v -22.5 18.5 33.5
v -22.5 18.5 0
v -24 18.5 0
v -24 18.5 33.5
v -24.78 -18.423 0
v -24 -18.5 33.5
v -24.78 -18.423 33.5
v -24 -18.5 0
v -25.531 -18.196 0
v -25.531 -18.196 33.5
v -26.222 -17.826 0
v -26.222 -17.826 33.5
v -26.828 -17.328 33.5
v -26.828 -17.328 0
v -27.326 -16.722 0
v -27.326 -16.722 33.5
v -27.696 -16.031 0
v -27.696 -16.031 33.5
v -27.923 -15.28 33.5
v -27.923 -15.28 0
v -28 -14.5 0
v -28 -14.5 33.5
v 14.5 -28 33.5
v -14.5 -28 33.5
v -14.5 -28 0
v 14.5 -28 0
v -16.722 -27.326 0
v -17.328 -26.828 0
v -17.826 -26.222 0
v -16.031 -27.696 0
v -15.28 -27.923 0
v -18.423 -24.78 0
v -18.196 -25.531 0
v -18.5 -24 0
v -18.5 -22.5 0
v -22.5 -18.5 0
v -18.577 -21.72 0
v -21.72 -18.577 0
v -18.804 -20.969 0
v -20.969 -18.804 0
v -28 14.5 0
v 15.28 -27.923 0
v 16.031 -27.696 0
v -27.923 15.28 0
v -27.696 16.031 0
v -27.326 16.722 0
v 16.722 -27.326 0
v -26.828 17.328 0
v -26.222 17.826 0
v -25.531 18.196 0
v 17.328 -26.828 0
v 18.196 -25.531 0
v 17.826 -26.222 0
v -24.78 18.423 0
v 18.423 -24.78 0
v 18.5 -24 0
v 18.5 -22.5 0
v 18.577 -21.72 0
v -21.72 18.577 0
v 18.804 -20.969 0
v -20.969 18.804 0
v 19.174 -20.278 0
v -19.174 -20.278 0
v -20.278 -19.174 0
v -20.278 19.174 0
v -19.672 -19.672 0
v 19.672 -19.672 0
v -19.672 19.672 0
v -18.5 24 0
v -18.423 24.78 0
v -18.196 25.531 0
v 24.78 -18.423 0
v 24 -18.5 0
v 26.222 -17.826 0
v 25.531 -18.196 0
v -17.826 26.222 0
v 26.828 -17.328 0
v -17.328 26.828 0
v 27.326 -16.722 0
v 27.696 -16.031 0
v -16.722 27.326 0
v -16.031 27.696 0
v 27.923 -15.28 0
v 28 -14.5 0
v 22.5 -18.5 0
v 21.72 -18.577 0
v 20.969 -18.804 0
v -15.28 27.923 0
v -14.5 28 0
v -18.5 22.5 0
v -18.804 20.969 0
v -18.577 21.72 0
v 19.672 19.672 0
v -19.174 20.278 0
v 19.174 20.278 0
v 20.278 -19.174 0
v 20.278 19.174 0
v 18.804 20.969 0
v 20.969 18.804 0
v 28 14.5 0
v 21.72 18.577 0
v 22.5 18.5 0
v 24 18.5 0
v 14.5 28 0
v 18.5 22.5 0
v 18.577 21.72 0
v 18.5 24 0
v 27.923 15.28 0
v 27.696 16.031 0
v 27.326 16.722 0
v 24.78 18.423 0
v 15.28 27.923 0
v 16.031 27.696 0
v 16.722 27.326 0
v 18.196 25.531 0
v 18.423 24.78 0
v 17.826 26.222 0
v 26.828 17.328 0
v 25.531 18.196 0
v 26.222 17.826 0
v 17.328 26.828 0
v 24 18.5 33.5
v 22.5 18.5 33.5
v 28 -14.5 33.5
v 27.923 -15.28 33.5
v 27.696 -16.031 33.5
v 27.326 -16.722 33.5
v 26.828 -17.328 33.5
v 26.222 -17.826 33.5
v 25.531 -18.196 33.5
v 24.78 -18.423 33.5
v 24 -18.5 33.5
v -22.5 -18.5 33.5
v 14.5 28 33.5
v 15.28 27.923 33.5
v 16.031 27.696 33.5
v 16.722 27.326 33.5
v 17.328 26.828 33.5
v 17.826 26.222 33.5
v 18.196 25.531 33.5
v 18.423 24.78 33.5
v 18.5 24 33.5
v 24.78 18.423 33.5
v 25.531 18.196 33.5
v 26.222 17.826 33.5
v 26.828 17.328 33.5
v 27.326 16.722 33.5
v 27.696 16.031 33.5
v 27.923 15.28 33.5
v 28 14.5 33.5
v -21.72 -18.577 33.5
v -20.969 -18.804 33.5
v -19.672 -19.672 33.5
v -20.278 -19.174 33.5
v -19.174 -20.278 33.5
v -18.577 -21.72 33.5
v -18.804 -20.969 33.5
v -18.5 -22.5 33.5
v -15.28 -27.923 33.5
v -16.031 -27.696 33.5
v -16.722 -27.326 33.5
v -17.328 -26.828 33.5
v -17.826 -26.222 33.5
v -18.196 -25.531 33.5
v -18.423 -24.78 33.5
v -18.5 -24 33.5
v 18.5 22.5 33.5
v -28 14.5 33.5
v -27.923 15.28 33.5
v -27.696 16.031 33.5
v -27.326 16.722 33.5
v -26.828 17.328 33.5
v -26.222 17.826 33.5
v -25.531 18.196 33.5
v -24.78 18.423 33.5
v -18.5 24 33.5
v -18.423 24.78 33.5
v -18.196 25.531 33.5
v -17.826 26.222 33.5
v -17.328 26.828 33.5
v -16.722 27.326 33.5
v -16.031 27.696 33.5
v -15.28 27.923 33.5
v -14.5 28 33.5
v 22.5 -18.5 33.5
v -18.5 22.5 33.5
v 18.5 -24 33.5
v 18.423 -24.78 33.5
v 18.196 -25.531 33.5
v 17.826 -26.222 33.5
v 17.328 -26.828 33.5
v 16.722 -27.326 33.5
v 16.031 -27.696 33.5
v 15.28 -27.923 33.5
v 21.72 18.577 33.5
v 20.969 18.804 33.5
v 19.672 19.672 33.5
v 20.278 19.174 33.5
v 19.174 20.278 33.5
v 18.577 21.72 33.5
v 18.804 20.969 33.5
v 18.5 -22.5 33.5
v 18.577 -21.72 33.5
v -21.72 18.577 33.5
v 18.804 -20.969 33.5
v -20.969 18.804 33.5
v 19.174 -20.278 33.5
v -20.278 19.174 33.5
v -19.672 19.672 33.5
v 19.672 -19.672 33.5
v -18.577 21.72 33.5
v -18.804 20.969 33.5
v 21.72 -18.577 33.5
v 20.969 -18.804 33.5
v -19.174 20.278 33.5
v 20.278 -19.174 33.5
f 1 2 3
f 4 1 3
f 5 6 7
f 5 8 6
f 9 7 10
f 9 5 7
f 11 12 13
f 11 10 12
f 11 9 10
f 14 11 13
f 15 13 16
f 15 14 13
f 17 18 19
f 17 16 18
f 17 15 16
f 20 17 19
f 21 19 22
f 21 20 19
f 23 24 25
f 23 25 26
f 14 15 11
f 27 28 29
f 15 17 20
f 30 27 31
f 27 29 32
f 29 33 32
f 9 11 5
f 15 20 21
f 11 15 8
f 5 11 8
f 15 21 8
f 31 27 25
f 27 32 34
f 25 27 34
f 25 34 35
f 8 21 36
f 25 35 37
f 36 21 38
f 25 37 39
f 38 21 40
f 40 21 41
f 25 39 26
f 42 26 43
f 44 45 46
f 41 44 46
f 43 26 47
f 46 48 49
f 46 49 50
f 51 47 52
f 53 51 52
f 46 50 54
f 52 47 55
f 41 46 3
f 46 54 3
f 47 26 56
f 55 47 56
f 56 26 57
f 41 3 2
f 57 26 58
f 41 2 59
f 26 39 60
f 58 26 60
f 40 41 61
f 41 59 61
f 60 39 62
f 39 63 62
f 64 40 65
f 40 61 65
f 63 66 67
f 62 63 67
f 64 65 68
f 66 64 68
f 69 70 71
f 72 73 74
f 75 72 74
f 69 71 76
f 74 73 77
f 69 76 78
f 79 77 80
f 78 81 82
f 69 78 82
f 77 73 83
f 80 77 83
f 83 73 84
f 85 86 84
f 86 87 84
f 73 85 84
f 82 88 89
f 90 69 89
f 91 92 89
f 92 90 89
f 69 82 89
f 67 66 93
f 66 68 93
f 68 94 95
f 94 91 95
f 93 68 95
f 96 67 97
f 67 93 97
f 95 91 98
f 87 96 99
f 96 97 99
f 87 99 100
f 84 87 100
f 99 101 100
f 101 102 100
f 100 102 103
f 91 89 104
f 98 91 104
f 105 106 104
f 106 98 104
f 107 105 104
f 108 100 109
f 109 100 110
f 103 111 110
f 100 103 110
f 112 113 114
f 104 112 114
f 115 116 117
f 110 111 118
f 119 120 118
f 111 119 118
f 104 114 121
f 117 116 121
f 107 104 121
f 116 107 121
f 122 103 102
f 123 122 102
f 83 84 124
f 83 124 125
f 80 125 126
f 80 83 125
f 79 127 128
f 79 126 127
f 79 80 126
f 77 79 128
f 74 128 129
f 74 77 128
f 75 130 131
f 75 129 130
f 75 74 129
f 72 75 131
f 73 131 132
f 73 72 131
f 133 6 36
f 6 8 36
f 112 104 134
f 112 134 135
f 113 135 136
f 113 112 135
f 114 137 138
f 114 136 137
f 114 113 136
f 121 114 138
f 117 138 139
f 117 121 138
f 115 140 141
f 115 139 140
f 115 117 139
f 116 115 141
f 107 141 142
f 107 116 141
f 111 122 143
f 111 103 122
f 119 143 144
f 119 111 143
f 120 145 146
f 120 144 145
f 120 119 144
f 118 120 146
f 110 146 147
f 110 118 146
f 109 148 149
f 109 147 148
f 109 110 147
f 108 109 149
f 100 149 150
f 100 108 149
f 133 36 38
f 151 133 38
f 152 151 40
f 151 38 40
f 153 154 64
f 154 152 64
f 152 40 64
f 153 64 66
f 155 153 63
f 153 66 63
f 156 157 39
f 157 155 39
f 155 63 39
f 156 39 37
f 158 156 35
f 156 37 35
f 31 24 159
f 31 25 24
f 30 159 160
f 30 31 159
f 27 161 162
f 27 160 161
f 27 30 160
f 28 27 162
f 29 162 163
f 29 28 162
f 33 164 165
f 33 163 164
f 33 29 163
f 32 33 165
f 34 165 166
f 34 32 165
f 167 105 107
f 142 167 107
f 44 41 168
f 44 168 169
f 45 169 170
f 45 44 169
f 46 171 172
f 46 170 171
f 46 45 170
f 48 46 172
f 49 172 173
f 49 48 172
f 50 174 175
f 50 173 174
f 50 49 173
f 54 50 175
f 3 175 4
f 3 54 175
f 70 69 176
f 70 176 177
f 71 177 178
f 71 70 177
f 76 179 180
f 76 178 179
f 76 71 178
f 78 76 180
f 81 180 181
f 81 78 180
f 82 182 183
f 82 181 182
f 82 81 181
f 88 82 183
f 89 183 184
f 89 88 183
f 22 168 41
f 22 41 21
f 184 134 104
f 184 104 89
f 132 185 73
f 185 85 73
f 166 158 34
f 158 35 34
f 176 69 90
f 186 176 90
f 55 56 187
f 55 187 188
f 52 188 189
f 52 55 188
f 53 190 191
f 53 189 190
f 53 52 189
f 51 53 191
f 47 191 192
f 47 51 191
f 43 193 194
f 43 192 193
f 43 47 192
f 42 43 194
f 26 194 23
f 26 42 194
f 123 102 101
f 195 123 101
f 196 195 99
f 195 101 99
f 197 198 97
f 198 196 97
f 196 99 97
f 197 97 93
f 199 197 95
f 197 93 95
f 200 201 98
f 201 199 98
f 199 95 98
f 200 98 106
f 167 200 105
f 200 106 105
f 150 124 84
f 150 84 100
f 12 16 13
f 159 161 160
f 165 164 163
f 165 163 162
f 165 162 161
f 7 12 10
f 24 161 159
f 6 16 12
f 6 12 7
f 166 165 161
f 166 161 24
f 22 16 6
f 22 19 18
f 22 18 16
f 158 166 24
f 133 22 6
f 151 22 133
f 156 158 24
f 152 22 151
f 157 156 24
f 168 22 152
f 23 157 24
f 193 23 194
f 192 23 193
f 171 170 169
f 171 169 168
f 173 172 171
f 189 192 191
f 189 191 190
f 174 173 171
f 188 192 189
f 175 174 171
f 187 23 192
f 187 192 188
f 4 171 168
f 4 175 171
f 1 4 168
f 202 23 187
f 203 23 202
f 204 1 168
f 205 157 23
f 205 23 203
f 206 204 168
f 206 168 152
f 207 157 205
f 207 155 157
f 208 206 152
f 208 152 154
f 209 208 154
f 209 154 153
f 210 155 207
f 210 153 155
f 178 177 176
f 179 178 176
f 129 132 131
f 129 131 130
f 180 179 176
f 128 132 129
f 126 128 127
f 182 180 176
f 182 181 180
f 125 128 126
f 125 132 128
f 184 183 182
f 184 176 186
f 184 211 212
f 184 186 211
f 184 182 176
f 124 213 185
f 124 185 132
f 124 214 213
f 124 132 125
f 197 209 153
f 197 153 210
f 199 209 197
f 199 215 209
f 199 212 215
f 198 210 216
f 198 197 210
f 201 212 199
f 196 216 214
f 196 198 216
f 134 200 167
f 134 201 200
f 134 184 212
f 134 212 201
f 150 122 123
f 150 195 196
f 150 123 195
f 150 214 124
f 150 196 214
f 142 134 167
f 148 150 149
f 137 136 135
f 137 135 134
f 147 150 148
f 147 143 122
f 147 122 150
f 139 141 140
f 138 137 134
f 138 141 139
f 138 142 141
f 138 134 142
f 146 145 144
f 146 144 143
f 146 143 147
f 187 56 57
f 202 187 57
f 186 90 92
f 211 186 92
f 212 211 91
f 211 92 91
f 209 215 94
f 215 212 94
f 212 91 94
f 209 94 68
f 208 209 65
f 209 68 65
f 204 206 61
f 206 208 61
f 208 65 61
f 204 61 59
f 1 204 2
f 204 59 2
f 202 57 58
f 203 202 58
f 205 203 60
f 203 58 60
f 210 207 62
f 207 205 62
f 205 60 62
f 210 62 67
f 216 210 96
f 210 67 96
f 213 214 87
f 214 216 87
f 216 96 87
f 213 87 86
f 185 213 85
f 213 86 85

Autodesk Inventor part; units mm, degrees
ref_plane "YZ Plane" through (0, 0, 0) normal (1, 0, 0) x (0, 1, 0)
ref_plane "XZ Plane" through (0, 0, 0) normal (0, 1, 0) x (-1, 0, 0)
ref_plane "XY Plane" through (0, 0, 0) normal (0, 0, 1) x (1, 0, 0)
sketch "Sketch1" plane through (0, 0, 0) normal (0, 0, 1) x (1, 0, 0)
  arc A0 (-24, 18.5) -> (-28, 14.5) centre (-24, 14.5) ccw
  line L0 (-28, 14.5) -> (-28, -14.5)
  arc A1 (-28, -14.5) -> (-24, -18.5) centre (-24, -14.5) ccw
  line L1 (-24, -18.5) -> (-22.5, -18.5)
  arc A2 (-18.5, -22.5) -> (-22.5, -18.5) centre (-22.5, -22.5) ccw
  line L2 (-18.5, -22.5) -> (-18.5, -24)
  arc A3 (-18.5, -24) -> (-14.5, -28) centre (-14.5, -24) ccw
  line L3 (-14.5, -28) -> (14.5, -28)
  arc A4 (14.5, -28) -> (18.5, -24) centre (14.5, -24) ccw
  line L4 (18.5, -24) -> (18.5, -22.5)
  arc A5 (22.5, -18.5) -> (18.5, -22.5) centre (22.5, -22.5) ccw
  line L5 (22.5, -18.5) -> (24, -18.5)
  arc A6 (24, -18.5) -> (28, -14.5) centre (24, -14.5) ccw
  line L6 (28, -14.5) -> (28, 14.5)
  arc A7 (28, 14.5) -> (24, 18.5) centre (24, 14.5) ccw
  line L7 (24, 18.5) -> (22.5, 18.5)
  arc A8 (18.5, 22.5) -> (22.5, 18.5) centre (22.5, 22.5) ccw
  line L8 (18.5, 22.5) -> (18.5, 24)
  arc A9 (18.5, 24) -> (14.5, 28) centre (14.5, 24) ccw
  line L9 (14.5, 28) -> (-14.5, 28)
  arc A10 (-14.5, 28) -> (-18.5, 24) centre (-14.5, 24) ccw
  line L10 (-18.5, 24) -> (-18.5, 22.5)
  arc A11 (-22.5, 18.5) -> (-18.5, 22.5) centre (-22.5, 22.5) ccw
  line L11 (-22.5, 18.5) -> (-24, 18.5)
  point P0 (0, 0)
  point P1 (0, 0)
extrude "Extrusion1" add sketch "Sketch1" along normal blind 33.5
properties part number "SERVO  KH56KM2U121 B"
